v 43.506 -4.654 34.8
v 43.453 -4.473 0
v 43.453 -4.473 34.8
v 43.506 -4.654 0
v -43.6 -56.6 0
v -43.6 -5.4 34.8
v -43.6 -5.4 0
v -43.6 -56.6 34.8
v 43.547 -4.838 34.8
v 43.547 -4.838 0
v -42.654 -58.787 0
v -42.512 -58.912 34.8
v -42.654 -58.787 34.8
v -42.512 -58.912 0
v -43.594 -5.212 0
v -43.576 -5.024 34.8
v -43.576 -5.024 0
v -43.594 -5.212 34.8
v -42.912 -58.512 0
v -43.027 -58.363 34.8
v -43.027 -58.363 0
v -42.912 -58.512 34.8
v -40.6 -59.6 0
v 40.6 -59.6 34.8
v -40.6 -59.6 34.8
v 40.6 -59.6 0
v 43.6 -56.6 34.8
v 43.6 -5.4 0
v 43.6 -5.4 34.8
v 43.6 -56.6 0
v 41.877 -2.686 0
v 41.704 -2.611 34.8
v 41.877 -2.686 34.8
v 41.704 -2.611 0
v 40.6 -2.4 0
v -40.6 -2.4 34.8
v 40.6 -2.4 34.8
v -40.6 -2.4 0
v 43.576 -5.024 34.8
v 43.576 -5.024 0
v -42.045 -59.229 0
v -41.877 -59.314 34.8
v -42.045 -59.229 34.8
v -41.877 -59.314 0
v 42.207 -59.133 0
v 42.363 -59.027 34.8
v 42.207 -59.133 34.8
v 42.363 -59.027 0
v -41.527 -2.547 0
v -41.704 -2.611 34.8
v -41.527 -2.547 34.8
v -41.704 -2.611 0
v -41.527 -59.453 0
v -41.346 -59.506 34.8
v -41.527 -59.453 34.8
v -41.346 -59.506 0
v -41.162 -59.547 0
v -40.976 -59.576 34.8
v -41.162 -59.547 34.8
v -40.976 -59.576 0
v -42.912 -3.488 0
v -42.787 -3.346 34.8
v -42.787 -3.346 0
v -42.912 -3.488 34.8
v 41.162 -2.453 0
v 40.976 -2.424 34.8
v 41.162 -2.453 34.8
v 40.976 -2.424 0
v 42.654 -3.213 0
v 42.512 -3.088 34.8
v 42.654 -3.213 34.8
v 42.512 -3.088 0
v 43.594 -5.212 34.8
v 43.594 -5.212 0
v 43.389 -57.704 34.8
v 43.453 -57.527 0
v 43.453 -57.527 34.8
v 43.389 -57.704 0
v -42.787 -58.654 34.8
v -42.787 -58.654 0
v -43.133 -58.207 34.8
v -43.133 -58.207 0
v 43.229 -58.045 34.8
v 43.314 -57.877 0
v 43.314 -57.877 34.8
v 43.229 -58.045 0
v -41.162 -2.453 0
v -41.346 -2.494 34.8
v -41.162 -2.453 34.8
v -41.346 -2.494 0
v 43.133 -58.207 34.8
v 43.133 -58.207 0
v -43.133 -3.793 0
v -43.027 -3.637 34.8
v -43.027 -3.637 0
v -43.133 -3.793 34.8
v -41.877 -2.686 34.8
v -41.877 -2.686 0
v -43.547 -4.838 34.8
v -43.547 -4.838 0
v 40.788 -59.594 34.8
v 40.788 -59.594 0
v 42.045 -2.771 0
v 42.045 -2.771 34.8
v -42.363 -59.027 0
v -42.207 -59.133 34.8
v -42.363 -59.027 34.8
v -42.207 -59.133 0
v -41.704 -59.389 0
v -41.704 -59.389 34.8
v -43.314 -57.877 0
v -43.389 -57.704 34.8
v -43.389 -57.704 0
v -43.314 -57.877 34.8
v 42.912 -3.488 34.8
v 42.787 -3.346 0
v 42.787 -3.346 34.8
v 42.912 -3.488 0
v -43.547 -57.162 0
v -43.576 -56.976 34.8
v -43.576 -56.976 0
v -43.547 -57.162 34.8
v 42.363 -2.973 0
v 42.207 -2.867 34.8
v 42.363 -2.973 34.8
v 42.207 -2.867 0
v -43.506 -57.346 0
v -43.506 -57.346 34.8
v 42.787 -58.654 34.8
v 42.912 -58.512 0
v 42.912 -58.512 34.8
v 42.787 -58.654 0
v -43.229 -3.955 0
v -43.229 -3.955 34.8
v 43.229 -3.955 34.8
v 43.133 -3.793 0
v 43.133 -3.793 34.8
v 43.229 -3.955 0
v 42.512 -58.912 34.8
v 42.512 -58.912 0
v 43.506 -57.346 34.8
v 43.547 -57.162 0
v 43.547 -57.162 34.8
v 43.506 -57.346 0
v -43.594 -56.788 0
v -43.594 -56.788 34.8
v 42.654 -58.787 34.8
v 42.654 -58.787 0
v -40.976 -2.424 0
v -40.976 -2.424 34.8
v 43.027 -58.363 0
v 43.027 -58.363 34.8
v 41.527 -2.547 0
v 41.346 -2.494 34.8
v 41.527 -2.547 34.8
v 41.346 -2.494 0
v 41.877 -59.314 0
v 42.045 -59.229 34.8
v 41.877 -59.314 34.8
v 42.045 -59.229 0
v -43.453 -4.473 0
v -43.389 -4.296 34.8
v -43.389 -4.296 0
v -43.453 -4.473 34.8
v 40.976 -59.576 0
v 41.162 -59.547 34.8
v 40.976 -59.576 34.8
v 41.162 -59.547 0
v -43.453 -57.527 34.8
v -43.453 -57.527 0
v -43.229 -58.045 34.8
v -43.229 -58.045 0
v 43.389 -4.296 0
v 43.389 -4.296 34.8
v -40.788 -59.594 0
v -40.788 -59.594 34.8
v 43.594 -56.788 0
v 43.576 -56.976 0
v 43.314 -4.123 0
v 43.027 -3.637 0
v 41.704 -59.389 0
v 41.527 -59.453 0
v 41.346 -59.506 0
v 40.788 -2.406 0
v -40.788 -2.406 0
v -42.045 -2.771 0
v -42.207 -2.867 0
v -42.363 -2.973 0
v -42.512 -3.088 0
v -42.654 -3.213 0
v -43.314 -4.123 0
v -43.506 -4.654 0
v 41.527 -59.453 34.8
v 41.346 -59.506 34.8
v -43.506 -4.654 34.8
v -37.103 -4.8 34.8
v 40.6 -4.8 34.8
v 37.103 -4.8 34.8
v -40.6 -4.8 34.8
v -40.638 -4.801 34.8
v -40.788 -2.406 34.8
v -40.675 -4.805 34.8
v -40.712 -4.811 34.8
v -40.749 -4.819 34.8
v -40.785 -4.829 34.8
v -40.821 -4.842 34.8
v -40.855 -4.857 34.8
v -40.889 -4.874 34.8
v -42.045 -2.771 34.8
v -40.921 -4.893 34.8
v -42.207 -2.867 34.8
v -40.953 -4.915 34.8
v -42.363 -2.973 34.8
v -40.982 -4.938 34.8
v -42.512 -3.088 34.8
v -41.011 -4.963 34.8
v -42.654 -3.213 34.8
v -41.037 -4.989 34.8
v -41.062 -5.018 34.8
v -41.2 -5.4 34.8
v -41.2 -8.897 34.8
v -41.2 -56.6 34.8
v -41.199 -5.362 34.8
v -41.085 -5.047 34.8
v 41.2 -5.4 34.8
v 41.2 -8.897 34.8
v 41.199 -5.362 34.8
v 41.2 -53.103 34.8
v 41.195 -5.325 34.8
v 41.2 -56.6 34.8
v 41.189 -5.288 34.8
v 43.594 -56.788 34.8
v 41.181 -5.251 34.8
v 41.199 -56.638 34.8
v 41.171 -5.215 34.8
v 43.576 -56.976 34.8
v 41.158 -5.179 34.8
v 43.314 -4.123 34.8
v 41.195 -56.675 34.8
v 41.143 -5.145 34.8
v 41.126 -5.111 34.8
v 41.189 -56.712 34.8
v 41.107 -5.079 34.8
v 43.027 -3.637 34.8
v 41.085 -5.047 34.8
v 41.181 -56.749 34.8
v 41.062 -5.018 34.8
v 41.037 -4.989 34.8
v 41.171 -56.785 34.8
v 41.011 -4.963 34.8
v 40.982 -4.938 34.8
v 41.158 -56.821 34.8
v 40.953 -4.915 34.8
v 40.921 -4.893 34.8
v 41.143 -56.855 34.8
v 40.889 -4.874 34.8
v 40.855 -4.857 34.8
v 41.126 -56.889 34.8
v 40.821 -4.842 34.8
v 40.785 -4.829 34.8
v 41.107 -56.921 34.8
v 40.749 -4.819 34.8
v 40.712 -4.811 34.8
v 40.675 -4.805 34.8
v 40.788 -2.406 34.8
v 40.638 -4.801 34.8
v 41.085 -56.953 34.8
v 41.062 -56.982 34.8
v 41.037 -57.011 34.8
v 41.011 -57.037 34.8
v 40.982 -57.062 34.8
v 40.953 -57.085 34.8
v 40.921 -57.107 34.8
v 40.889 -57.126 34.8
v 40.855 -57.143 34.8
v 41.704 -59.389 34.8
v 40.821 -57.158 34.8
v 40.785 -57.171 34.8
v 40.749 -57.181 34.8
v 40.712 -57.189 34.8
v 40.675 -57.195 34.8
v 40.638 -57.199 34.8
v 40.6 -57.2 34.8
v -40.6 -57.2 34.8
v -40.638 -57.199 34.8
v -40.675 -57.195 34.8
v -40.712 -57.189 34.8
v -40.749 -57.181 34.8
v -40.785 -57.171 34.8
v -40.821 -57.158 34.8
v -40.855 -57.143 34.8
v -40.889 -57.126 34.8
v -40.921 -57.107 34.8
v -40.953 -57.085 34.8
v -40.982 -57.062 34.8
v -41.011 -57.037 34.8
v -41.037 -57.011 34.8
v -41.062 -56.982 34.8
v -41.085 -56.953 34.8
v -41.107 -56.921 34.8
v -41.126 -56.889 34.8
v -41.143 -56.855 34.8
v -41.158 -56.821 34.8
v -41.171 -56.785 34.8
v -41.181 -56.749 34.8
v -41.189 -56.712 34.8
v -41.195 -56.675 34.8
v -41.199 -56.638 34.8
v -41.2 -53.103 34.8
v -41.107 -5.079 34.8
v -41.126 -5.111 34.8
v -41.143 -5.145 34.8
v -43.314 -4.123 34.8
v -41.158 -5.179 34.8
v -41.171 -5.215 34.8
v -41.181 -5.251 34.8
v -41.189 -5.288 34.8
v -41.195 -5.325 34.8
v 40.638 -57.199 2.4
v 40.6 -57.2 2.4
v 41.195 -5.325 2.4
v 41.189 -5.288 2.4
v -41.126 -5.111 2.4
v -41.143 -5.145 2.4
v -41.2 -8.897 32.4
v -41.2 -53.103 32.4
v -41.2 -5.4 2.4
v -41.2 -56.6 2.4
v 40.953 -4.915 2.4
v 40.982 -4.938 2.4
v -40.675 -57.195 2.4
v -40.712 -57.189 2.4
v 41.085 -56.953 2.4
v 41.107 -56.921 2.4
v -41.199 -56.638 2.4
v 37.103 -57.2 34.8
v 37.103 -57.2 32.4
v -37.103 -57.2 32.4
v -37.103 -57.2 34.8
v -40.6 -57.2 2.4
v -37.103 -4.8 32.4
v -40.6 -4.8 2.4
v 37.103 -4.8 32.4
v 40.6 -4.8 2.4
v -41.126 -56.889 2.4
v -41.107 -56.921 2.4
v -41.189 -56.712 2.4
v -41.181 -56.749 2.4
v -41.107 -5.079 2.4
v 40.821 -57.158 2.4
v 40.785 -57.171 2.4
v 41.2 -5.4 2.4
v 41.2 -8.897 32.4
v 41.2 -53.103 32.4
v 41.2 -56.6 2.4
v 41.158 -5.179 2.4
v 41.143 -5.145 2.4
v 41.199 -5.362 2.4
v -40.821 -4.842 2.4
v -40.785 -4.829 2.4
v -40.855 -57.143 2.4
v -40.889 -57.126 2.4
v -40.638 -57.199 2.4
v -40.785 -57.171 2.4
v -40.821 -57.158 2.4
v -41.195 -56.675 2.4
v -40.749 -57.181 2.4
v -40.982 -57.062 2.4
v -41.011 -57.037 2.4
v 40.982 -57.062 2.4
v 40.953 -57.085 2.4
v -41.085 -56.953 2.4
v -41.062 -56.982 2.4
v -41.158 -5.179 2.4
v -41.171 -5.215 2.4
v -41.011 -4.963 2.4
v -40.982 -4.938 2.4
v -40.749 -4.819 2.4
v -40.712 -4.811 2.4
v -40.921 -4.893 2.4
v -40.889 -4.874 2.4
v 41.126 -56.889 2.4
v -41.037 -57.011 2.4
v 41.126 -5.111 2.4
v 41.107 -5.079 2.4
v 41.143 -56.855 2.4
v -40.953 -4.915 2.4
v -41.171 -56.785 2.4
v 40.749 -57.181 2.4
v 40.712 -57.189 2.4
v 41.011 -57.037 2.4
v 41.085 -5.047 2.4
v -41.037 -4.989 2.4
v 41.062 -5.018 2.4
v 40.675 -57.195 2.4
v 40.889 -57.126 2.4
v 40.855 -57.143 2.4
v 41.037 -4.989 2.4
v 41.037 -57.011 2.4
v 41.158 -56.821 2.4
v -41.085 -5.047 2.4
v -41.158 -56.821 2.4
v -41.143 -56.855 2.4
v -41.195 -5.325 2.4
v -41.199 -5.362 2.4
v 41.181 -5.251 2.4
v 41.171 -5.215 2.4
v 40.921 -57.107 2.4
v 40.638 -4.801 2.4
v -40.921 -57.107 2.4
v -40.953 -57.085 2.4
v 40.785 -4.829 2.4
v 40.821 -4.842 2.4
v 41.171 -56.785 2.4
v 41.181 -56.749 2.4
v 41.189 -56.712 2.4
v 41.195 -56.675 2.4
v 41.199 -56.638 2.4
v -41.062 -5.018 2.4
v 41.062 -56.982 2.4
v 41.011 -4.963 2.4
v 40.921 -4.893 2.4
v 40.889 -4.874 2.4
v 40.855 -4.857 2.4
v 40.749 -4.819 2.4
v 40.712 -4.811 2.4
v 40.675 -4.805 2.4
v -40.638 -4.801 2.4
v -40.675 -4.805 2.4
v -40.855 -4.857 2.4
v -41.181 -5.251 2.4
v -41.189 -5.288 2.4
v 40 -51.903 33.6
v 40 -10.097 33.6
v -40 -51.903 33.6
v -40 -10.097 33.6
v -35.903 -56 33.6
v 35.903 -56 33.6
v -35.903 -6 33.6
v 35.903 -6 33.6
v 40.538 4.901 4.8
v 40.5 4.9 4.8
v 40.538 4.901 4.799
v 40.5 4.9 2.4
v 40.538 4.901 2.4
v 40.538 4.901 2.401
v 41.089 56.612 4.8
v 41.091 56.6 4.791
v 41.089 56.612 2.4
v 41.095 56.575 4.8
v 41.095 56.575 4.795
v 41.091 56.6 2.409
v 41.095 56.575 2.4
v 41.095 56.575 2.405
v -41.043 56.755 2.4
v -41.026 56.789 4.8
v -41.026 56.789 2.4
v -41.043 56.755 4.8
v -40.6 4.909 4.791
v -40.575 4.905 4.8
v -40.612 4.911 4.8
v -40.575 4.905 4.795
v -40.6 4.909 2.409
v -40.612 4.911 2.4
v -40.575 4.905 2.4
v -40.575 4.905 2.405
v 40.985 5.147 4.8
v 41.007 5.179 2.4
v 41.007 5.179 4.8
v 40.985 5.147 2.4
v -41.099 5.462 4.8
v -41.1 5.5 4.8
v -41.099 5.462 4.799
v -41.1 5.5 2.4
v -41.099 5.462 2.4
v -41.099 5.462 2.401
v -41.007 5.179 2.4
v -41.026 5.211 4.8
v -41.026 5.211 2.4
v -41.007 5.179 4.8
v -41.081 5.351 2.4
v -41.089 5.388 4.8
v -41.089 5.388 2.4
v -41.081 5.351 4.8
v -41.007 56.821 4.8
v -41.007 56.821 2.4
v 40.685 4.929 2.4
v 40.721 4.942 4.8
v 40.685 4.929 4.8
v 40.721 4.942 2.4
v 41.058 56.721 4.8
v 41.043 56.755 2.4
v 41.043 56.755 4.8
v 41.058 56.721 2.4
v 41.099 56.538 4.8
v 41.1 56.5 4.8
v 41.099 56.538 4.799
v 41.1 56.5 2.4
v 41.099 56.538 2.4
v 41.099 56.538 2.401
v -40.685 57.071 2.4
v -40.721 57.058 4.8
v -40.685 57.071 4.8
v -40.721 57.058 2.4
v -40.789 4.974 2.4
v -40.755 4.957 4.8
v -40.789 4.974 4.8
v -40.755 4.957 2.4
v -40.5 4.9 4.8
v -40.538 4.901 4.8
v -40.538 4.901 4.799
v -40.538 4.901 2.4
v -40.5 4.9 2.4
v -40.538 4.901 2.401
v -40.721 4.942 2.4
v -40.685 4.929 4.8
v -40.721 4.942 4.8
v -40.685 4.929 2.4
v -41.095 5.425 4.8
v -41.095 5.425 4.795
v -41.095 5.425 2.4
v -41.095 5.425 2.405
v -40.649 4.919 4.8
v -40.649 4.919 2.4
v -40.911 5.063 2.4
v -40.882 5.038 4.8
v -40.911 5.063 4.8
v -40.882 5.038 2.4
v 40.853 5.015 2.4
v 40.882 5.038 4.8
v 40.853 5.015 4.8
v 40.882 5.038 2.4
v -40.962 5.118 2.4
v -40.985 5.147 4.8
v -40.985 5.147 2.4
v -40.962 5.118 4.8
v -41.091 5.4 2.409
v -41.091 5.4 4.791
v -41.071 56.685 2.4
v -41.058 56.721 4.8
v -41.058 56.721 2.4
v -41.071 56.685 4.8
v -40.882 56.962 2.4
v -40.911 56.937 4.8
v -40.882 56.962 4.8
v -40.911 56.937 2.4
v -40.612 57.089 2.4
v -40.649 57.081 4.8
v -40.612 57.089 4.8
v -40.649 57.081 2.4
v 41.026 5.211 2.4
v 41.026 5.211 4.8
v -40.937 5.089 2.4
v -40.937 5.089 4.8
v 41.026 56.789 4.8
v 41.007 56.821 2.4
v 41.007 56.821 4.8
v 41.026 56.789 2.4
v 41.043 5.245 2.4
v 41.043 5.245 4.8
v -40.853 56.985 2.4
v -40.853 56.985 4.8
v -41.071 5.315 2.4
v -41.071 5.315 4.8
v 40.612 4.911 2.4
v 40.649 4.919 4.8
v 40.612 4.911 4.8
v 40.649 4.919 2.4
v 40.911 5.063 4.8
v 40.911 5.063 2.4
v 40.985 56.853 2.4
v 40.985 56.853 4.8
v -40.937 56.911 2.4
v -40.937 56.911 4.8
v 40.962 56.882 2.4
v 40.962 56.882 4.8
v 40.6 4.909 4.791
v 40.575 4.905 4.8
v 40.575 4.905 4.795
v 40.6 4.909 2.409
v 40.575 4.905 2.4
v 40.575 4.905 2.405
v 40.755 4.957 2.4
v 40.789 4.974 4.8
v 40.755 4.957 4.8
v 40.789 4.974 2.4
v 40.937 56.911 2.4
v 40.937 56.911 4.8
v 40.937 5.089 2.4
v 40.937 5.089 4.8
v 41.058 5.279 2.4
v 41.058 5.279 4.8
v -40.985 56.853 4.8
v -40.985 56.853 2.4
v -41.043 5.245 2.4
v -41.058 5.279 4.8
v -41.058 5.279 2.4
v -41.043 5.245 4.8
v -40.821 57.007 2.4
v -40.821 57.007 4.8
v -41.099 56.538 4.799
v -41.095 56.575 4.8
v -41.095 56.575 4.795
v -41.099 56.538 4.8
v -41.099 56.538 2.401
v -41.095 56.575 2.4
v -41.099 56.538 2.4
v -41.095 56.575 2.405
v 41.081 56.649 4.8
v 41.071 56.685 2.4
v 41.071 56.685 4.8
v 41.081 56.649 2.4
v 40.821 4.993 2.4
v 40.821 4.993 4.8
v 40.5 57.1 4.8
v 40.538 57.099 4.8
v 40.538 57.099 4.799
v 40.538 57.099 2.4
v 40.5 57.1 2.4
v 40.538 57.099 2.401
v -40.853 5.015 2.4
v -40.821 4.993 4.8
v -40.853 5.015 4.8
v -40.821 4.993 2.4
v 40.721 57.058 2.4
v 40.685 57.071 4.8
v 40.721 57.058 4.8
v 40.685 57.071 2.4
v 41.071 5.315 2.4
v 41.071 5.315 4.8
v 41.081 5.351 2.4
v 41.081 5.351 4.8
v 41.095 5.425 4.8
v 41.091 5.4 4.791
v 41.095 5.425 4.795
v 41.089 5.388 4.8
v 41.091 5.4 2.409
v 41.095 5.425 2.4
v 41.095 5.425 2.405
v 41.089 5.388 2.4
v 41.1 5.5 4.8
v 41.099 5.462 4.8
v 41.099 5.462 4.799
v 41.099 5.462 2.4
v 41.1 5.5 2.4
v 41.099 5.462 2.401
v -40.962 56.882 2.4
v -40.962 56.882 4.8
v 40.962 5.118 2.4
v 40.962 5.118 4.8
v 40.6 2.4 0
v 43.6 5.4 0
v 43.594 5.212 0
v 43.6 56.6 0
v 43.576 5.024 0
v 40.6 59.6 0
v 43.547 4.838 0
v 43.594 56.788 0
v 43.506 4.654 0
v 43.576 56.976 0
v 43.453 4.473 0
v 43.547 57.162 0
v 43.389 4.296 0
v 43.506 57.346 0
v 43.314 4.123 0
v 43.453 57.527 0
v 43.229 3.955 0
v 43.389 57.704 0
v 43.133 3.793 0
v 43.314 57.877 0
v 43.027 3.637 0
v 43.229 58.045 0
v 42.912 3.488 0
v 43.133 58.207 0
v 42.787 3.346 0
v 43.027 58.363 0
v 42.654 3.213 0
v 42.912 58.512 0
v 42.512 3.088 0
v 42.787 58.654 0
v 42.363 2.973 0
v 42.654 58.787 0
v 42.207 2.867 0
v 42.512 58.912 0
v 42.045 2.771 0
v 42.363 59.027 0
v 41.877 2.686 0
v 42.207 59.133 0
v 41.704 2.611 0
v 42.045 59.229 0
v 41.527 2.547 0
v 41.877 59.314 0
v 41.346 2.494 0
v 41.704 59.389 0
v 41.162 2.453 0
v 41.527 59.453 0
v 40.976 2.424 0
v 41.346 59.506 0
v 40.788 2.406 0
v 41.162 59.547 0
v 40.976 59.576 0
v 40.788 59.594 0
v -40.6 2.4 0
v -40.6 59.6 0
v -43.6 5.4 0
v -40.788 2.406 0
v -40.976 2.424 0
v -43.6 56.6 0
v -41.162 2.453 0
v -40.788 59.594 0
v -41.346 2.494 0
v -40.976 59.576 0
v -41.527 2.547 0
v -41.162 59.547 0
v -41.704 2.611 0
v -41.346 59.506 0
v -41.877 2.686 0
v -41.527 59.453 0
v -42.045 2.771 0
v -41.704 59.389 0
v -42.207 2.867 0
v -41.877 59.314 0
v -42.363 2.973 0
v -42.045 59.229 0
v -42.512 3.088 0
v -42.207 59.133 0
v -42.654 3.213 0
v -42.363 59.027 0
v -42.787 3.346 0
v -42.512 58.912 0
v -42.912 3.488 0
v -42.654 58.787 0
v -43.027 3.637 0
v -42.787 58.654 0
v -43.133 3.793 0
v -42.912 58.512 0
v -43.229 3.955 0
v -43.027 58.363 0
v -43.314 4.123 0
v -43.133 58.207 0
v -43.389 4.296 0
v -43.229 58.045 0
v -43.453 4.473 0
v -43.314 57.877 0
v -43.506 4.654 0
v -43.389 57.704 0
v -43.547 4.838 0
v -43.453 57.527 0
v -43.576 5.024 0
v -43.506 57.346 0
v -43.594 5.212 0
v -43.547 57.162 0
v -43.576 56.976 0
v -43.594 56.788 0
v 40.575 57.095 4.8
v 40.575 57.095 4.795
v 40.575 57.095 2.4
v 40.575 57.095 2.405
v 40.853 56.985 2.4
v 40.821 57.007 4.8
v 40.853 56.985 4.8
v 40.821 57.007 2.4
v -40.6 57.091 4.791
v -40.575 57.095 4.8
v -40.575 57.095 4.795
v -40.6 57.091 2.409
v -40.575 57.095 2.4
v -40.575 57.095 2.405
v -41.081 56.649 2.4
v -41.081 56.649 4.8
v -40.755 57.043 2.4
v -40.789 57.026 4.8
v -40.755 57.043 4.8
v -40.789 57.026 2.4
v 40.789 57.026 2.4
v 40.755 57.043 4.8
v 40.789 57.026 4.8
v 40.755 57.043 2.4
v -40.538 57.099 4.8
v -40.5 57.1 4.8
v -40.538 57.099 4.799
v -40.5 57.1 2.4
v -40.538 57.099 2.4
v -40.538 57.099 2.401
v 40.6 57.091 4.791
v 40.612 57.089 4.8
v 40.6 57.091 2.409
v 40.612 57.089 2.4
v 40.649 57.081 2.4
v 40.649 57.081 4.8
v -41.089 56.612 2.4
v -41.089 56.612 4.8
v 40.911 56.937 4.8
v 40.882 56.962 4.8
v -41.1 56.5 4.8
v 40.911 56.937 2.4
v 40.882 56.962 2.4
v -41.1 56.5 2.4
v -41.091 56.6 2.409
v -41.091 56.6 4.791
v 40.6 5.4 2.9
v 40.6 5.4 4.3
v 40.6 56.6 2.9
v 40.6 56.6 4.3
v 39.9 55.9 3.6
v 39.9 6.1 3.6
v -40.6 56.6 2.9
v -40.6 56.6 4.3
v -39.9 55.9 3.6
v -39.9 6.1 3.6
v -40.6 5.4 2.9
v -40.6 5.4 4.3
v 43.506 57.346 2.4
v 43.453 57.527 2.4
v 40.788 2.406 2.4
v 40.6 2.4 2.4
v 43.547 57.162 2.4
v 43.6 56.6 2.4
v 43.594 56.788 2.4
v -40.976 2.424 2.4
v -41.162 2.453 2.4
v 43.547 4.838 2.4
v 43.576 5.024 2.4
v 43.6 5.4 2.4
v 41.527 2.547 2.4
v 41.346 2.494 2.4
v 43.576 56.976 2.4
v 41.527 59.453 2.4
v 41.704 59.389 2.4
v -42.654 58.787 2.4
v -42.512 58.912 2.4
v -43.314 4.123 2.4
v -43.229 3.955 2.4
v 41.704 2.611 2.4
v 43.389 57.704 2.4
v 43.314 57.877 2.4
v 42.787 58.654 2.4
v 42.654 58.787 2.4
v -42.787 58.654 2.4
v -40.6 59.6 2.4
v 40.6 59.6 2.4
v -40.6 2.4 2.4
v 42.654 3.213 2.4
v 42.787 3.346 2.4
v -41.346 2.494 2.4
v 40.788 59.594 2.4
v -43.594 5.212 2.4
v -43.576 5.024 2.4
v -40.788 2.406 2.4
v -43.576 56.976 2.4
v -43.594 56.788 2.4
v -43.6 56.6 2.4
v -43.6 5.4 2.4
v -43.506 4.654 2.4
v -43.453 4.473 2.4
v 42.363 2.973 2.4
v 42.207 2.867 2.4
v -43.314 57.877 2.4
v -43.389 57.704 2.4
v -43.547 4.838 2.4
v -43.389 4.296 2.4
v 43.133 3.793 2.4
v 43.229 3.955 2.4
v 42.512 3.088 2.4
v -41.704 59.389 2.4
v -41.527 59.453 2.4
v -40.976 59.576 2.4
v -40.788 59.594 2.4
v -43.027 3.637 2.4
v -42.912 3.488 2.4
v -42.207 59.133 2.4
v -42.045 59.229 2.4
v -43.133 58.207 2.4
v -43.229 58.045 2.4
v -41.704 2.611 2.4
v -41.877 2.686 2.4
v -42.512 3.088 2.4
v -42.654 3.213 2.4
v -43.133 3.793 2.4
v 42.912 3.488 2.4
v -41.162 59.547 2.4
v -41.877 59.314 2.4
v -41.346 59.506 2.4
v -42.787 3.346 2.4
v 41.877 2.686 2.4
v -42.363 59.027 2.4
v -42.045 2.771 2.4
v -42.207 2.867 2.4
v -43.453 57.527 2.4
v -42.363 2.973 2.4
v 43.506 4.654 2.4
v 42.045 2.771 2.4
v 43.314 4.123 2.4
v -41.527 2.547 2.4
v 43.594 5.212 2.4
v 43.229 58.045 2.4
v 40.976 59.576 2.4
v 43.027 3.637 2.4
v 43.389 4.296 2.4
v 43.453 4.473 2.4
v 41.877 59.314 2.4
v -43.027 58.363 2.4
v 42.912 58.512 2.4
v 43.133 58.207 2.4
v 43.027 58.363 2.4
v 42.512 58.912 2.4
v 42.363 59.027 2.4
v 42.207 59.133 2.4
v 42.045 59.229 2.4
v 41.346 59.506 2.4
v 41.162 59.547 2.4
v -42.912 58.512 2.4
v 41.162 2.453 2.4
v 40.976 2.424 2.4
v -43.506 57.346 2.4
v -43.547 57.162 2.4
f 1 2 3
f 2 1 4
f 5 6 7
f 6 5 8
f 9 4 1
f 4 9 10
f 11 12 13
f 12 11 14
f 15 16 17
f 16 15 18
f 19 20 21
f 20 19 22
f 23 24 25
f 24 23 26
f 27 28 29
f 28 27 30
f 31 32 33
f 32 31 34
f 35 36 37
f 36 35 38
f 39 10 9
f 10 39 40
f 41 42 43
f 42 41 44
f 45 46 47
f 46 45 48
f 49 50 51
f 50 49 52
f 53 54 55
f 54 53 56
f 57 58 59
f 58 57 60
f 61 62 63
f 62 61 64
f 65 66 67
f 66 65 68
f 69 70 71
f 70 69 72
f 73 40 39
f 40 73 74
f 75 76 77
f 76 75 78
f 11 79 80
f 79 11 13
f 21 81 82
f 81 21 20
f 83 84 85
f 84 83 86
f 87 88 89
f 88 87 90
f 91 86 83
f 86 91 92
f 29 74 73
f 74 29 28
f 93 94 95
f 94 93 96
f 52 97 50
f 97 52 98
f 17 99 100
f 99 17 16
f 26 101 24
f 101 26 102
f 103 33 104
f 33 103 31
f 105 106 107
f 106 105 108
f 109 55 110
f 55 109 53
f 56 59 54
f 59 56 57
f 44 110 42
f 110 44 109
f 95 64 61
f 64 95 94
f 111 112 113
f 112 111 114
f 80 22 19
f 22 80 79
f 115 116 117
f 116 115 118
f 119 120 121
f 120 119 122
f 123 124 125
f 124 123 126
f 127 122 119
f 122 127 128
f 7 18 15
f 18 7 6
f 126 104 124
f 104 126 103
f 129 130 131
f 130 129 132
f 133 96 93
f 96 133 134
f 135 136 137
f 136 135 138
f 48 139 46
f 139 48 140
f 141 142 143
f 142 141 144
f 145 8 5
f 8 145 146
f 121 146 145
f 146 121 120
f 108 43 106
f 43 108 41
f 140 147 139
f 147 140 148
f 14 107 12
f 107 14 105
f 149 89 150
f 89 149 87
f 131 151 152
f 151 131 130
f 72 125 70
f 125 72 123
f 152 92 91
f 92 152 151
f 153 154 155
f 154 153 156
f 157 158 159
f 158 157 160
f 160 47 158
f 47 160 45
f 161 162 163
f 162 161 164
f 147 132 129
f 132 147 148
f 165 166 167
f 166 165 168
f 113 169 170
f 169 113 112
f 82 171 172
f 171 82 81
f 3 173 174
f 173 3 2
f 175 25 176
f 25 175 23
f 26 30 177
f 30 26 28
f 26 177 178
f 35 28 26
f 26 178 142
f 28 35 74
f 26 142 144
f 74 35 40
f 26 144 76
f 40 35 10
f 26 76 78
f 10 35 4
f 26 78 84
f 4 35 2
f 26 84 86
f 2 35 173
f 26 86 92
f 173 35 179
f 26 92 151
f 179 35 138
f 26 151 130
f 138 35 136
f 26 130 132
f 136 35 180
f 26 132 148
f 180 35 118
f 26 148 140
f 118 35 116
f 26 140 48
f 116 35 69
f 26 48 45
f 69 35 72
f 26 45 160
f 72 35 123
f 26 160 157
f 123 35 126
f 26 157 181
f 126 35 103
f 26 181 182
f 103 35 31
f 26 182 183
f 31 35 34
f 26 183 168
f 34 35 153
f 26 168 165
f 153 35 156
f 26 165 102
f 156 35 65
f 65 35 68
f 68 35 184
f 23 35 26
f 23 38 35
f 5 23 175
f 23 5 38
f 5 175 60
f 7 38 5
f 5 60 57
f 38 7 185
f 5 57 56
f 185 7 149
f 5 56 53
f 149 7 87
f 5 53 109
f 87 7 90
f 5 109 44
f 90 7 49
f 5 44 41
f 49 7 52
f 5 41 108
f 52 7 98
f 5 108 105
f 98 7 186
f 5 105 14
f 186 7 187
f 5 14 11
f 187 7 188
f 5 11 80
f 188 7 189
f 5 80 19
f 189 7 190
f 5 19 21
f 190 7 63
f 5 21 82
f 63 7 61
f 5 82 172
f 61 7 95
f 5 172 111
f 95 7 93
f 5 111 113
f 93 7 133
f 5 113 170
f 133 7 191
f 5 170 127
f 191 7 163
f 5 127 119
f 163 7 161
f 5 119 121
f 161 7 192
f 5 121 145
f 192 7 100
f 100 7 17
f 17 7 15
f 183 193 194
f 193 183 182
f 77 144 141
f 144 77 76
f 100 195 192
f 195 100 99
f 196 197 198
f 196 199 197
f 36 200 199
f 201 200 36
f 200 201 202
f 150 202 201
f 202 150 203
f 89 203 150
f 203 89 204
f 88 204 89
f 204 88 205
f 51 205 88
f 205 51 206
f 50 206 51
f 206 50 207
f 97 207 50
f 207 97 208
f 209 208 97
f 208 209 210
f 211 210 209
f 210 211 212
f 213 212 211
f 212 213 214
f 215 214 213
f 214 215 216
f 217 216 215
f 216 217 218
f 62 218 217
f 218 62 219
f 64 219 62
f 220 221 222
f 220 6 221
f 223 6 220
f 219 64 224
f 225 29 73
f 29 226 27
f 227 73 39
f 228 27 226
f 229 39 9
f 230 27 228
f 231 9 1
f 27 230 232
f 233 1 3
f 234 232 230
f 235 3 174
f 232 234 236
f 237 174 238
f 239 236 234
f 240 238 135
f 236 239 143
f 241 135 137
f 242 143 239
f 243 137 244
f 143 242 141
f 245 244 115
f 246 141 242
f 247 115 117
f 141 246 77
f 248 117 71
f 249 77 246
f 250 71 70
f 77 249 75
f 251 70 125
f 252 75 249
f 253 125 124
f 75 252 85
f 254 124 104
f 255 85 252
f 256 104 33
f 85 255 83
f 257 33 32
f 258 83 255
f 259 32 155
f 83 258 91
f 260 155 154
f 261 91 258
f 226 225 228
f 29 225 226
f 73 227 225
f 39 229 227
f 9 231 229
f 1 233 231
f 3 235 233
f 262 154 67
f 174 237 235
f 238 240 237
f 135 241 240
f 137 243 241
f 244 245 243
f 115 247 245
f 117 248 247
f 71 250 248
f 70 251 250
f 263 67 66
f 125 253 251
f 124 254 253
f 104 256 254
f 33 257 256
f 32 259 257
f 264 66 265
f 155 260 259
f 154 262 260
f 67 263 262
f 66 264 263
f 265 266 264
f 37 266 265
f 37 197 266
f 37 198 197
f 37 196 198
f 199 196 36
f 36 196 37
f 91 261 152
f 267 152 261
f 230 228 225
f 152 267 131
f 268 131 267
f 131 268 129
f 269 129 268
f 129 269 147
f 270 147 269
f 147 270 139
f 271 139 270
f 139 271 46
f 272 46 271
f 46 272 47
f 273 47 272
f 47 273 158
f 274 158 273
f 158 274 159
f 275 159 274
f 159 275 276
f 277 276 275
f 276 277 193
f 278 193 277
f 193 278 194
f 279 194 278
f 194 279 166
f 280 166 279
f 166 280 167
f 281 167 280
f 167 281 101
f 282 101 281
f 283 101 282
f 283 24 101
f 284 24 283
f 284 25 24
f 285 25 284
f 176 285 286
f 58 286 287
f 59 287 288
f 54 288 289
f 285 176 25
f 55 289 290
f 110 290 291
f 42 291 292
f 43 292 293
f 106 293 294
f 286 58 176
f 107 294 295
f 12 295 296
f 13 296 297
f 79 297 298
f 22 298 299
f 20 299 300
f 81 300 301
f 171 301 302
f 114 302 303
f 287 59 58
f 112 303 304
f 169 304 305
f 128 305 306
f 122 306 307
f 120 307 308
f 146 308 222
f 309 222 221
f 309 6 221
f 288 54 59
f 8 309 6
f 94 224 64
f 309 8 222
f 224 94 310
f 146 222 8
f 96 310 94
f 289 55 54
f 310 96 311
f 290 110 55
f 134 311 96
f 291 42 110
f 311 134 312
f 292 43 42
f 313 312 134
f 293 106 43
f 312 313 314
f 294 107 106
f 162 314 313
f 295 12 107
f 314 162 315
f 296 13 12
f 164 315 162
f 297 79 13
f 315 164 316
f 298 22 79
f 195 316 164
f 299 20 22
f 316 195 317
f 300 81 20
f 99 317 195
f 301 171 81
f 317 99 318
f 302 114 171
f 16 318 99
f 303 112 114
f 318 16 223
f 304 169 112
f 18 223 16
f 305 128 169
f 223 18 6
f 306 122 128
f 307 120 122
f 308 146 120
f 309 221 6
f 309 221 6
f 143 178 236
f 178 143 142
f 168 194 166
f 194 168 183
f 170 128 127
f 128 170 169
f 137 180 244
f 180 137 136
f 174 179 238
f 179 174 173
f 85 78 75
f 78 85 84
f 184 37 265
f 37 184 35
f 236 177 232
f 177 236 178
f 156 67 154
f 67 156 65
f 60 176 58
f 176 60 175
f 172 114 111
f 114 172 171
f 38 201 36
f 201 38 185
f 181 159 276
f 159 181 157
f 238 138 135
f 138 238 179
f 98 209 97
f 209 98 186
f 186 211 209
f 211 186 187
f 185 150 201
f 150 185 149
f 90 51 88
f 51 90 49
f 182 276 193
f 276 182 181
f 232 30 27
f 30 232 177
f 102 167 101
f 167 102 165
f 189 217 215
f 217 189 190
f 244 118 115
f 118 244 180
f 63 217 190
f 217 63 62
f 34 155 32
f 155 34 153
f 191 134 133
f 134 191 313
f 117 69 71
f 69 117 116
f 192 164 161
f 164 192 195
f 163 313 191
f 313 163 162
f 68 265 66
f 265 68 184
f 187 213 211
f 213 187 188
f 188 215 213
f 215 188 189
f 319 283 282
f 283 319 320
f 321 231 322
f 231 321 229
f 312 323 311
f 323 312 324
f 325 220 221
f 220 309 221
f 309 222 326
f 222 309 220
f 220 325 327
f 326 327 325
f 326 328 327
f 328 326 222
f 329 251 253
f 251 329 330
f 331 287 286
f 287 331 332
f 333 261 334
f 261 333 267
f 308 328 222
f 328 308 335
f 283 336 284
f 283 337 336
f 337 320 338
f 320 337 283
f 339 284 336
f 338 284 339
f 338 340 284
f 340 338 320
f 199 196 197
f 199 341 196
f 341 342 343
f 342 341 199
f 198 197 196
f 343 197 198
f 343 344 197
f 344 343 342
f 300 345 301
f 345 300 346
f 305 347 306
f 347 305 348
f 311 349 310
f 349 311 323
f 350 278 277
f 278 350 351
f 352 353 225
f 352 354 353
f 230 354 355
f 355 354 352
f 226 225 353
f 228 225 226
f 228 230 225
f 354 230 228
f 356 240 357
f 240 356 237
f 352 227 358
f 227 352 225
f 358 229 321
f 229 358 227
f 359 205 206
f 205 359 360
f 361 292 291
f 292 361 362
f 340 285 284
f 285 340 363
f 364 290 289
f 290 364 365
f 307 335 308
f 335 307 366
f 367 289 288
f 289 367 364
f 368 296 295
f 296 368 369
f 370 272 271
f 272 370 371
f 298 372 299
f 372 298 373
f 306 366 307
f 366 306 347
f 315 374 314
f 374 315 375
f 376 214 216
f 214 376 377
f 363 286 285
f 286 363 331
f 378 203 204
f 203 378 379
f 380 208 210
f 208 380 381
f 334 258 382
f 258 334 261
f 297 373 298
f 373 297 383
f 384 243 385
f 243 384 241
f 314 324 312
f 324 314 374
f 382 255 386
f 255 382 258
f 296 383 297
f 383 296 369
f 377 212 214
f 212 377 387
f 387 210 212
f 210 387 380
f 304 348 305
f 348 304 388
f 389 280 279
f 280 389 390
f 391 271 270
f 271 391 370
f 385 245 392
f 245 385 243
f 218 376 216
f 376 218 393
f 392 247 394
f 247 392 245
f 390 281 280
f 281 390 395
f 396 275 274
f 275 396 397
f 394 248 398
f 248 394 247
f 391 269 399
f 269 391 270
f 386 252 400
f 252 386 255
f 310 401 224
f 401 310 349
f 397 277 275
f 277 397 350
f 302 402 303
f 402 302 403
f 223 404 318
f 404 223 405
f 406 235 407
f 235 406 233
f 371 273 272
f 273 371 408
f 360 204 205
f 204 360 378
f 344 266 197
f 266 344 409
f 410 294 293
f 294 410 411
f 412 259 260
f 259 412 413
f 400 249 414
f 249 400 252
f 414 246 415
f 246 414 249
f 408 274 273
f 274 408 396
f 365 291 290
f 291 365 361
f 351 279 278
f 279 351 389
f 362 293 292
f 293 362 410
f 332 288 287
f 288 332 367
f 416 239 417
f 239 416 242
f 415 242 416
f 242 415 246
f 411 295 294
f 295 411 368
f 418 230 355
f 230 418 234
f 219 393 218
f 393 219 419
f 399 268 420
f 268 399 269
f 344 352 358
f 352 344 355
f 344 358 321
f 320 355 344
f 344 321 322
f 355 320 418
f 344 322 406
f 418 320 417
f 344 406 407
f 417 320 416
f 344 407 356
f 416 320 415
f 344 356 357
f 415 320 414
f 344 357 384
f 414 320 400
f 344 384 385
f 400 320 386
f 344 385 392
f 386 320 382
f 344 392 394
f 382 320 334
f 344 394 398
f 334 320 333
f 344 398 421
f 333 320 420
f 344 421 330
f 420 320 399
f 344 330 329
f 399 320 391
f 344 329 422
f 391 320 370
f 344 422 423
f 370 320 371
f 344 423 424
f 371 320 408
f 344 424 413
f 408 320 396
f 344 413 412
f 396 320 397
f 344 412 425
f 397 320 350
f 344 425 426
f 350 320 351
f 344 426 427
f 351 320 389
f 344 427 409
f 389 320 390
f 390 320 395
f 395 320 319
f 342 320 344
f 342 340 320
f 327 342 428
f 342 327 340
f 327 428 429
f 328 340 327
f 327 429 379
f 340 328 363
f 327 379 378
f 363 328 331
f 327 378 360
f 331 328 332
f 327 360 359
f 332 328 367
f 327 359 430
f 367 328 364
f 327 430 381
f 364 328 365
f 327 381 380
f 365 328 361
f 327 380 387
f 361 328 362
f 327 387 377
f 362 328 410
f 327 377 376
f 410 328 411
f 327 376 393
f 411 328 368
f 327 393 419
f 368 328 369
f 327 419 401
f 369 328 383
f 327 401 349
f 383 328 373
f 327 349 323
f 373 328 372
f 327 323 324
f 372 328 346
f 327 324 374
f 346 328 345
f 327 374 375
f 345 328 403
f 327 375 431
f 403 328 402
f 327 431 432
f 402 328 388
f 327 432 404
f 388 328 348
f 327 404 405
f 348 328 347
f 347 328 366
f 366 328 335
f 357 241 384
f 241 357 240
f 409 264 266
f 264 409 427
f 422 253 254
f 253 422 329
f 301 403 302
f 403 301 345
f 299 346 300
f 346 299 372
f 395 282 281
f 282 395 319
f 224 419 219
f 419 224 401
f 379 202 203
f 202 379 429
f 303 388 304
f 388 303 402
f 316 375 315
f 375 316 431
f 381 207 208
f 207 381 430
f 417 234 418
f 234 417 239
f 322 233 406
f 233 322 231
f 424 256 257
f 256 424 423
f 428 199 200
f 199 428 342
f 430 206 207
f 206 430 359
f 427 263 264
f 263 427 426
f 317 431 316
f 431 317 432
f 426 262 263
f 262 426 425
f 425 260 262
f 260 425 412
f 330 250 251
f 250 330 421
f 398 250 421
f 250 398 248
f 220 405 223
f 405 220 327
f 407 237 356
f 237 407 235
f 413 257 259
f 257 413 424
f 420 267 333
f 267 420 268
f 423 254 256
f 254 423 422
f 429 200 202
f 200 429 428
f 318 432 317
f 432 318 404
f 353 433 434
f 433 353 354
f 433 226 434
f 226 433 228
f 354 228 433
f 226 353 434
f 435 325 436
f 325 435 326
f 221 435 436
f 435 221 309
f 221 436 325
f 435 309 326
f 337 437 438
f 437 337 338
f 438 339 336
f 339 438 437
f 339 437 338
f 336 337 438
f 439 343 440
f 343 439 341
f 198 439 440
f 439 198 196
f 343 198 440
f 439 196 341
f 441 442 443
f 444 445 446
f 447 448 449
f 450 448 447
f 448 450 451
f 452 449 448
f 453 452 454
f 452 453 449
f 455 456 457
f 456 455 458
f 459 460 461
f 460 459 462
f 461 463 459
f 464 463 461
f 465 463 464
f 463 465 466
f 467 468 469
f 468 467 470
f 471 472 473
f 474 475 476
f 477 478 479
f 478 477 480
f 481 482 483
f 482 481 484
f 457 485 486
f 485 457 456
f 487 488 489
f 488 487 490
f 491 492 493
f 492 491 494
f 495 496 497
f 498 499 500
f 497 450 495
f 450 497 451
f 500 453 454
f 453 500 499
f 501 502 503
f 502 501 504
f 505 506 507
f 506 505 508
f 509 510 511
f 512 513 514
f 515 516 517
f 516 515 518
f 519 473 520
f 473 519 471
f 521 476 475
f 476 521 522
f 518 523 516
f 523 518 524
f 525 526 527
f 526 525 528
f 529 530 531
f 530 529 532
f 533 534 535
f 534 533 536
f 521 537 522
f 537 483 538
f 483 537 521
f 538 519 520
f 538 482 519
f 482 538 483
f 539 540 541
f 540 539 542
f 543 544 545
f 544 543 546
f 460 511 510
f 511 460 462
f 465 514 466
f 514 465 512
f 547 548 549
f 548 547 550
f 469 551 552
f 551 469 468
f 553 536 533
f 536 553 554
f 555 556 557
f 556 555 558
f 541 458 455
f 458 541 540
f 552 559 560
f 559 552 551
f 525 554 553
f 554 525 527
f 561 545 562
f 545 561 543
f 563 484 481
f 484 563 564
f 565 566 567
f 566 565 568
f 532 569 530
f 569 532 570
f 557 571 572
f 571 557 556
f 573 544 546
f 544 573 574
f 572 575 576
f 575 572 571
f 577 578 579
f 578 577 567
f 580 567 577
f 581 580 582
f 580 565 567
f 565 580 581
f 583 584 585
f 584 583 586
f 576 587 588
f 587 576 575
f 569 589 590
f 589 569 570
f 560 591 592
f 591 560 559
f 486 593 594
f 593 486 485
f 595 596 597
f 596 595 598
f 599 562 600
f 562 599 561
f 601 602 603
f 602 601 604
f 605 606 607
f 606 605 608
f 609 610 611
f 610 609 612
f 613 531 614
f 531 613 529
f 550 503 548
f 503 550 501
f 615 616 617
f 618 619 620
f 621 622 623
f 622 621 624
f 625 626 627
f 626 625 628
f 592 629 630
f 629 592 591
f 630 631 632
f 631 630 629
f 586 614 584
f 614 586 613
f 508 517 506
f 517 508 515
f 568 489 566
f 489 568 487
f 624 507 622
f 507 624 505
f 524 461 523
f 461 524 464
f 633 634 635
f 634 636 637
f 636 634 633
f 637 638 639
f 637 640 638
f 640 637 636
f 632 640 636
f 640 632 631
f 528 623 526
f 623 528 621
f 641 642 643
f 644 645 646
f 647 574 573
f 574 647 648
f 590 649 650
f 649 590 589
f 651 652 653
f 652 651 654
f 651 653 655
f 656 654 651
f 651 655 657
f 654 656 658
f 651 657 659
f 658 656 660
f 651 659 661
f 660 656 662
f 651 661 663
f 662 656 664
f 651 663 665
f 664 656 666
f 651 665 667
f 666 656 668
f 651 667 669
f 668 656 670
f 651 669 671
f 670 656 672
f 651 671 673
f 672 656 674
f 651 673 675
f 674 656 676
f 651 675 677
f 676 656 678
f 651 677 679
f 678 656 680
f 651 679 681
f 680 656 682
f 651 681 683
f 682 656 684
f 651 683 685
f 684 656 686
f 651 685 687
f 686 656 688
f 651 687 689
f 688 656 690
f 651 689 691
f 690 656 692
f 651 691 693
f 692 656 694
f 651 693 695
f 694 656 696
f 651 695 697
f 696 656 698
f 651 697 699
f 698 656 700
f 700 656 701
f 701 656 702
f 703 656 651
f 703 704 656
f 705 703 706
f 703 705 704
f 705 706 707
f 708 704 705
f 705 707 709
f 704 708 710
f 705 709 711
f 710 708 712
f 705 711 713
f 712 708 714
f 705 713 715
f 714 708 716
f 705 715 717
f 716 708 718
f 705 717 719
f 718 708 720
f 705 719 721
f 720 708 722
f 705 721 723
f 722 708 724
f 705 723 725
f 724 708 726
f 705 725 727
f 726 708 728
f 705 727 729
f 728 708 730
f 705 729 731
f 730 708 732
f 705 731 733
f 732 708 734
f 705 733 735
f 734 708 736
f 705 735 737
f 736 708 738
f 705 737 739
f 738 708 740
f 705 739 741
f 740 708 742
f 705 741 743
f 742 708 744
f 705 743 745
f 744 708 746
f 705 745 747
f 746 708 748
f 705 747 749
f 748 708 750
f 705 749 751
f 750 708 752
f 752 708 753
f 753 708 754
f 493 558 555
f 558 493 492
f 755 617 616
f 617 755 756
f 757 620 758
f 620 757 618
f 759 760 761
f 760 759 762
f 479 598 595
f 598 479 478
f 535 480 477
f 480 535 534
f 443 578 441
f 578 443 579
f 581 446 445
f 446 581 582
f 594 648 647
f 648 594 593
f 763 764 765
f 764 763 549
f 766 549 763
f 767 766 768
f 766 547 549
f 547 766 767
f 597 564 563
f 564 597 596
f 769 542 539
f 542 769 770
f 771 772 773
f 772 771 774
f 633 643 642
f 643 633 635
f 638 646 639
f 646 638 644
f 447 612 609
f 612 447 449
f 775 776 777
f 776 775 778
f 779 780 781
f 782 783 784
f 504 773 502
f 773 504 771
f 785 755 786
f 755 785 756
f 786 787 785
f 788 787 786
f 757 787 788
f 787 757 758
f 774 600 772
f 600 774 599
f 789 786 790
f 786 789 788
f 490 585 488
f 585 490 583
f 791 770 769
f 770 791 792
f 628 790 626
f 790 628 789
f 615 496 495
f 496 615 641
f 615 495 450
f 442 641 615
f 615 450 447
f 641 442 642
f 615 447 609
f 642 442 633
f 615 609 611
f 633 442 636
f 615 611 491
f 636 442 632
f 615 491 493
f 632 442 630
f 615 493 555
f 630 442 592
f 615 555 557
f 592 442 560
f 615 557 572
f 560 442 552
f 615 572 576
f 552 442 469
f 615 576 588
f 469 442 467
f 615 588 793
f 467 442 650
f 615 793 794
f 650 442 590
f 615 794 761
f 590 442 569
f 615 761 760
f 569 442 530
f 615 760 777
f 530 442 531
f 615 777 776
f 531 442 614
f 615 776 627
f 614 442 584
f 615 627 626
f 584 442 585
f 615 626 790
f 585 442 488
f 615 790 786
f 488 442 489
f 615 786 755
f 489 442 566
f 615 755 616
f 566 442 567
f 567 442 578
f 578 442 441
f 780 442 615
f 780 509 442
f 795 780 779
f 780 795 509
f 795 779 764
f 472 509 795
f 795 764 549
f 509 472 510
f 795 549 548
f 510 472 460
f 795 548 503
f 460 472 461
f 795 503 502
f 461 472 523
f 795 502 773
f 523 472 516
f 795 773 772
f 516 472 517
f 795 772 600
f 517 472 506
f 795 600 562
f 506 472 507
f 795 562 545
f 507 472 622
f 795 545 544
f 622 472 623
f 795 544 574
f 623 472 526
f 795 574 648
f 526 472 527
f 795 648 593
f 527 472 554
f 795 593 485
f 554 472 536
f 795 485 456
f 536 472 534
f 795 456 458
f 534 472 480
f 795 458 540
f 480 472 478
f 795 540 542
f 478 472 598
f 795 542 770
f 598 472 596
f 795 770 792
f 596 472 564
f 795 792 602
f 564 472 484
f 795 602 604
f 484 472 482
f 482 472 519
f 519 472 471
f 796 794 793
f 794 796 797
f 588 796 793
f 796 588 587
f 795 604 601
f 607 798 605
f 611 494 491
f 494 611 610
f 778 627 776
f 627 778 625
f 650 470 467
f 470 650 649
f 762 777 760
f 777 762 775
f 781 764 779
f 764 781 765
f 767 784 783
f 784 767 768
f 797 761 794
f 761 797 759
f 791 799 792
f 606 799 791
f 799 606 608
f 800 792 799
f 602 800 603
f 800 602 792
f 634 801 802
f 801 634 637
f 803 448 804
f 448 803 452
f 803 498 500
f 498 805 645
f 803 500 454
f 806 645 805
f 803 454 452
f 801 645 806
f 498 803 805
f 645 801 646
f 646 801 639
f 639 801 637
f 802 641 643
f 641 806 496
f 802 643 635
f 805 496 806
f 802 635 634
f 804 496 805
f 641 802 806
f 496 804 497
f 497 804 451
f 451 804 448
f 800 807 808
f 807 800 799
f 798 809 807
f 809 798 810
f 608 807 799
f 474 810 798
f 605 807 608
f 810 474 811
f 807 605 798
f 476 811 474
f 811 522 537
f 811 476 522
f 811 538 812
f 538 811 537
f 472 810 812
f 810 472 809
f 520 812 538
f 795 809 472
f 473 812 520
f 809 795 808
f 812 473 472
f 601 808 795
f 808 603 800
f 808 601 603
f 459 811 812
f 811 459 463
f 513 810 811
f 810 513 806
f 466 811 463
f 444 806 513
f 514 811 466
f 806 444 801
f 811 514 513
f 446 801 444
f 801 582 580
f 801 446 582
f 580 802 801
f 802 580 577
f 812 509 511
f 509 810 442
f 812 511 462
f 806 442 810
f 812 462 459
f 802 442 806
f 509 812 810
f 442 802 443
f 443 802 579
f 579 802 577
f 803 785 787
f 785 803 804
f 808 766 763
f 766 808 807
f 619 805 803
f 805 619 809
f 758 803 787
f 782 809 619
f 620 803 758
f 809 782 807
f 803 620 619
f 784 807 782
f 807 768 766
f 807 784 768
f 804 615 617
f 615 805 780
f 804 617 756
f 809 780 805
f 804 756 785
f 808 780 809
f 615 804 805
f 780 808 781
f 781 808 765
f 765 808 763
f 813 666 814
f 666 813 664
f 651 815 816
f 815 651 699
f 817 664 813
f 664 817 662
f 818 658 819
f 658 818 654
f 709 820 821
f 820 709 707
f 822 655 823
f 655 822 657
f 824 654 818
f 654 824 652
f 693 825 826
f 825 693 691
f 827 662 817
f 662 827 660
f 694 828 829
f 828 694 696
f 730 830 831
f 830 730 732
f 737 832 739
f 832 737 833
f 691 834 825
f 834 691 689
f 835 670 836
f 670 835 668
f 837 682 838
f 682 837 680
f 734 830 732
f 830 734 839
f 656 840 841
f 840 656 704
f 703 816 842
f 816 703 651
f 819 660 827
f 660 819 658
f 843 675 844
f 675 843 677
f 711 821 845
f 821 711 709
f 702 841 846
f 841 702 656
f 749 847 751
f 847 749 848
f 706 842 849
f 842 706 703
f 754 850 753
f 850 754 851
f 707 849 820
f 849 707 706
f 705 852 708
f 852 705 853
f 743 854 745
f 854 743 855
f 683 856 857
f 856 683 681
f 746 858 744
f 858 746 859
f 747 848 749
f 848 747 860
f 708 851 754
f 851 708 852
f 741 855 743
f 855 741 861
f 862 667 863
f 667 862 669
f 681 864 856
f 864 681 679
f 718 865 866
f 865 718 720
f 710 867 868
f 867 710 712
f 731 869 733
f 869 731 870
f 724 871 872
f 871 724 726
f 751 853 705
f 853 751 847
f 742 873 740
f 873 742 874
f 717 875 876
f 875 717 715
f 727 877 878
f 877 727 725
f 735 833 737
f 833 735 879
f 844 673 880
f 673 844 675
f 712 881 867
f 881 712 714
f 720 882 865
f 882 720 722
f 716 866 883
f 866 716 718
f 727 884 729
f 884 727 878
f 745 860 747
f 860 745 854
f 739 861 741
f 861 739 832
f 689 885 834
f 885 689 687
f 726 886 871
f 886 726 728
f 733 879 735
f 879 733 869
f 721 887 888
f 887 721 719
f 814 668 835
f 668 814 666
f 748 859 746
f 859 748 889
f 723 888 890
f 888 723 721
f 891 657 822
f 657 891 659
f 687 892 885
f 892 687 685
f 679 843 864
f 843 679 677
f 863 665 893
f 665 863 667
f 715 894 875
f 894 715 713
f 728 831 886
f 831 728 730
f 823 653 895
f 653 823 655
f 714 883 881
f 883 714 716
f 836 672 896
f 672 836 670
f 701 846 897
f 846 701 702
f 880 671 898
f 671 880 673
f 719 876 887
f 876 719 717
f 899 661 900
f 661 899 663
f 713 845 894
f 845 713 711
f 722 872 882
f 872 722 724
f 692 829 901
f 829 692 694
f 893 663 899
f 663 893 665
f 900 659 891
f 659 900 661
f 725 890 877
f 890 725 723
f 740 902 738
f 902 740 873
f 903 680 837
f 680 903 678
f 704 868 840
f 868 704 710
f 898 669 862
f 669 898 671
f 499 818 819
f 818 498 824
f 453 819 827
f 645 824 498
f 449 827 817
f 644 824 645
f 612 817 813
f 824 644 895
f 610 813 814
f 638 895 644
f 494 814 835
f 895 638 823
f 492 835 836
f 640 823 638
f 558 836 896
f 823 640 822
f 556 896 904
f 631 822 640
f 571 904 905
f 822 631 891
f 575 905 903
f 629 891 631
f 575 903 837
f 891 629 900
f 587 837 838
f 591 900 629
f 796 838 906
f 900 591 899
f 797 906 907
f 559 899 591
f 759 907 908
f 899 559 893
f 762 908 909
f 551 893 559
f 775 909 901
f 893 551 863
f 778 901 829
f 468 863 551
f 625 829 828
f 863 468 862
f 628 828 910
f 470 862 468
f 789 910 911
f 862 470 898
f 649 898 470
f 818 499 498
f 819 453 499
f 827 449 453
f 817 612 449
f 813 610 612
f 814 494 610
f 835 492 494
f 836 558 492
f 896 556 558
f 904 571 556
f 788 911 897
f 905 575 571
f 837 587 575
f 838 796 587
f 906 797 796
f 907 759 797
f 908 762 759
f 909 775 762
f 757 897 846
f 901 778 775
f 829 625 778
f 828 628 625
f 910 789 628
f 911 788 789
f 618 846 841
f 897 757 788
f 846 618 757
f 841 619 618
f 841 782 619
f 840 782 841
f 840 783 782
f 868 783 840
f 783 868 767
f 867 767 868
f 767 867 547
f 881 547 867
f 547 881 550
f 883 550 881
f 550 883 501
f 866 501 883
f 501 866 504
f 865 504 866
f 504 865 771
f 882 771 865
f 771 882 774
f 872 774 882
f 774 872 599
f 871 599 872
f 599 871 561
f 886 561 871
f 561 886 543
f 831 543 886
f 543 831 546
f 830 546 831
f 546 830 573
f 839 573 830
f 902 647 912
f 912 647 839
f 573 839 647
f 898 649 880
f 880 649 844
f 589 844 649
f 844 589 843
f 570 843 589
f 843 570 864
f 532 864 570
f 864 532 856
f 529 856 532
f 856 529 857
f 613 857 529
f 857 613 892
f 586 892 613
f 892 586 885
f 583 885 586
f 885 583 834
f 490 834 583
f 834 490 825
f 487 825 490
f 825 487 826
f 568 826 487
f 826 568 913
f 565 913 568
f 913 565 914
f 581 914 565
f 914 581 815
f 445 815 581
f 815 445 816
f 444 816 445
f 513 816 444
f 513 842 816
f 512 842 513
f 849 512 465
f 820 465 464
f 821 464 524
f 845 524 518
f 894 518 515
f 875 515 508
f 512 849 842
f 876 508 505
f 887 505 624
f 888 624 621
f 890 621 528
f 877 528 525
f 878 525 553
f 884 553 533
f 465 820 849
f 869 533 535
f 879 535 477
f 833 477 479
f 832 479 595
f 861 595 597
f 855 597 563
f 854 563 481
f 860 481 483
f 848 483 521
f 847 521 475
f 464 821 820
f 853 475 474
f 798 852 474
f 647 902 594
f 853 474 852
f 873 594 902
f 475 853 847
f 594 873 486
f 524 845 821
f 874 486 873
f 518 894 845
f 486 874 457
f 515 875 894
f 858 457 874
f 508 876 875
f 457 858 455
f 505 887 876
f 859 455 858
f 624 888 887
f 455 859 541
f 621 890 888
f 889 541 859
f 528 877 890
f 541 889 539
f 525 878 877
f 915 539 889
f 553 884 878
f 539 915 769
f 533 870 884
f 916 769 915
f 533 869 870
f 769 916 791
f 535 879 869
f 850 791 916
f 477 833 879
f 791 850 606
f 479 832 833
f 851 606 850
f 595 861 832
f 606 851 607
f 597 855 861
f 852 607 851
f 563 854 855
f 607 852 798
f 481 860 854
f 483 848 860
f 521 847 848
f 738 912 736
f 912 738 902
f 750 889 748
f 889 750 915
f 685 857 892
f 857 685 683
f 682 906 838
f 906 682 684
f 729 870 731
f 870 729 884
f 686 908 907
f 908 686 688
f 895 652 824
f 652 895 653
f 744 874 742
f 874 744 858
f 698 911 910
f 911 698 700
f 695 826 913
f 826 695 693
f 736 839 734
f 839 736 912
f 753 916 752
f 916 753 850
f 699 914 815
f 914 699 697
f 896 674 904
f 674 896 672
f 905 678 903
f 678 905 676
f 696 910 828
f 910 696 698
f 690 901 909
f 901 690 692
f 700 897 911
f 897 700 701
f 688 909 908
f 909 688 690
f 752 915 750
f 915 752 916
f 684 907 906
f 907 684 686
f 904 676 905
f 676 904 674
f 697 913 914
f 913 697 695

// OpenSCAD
// Which one would you like to see?
part = "both"; // [box:Box only, top: Top cover only, both: Box and top cover]

// Size of your printer's nozzle in mm
nozzle_size = 0.4;

// Number of walls the print should have
number_of_walls = 6; // [1:5]

// Tolerance (use 0.2 for FDM)
tolerance = 0.2; // [0.1:0.1:0.4]

// Outer x dimension in mm
x=80+2*number_of_walls*nozzle_size+2*3*nozzle_size;

// Outer y dimension in mm
y=50+2*number_of_walls*nozzle_size+2*3*nozzle_size;

// Outer z dimension in mm
z=30+2*number_of_walls*nozzle_size+2*3*nozzle_size;

// Radius for rounded corners in mm
radius=3; // [1:20]

/* Hidden */
$fn=100;

wall_thickness=nozzle_size*number_of_walls;
hook_thickness = 3*nozzle_size;

top_cover_wall_thickness = hook_thickness + wall_thickness;

module bottom_box () {
    difference(){
        // Solid box
        linear_extrude(z-wall_thickness){
            minkowski(){
                square([x-radius*2,y-radius*2], center=true);
                circle(radius, center=true);
            }
        }
        
        // Hollow out
        translate([0,0,wall_thickness]) linear_extrude(z){
            minkowski(){
                square([x-radius*2-wall_thickness*2+wall_thickness*2,y-radius*2-wall_thickness*2+wall_thickness*2], center=true);
                circle(radius-wall_thickness);
            }
        }
    }
    left_hook(); // left hook
    rotate([180,180,0]) left_hook(); // right hook
    front_hook(); // front hook
    rotate([180,180,0]) front_hook(); // back hook
    // TODO: hooks on the other two sides
}

module left_hook () {
    
    translate([(x-2*wall_thickness)/2,-y/2+radius*2,z-wall_thickness]) rotate([0,90,90]) {
        difference(){
            linear_extrude(y-2*radius*2){
    polygon(points=[[0,0],[2*hook_thickness,0],[hook_thickness,hook_thickness]], center=true);
        }
             translate([hook_thickness, hook_thickness, 0]) rotate([45,0,0]) cube(2*hook_thickness, center=true);
             translate([hook_thickness, hook_thickness, y-2*radius*2]) rotate([45,0,0]) cube(2*hook_thickness, center=true);        
        }
    }
}
    

module front_hook () {
    translate([(-x+4*radius)/2,-y/2+wall_thickness,z-wall_thickness]) rotate([90,90,90]) {
        difference(){
        linear_extrude(x-2*radius*2){
    polygon(points=[[0,0],[2*hook_thickness,0],[hook_thickness,hook_thickness]], center=true);
    }
             translate([hook_thickness, hook_thickness, 0]) rotate([45,0,0]) cube(2*hook_thickness, center=true);
             translate([hook_thickness, hook_thickness, x-2*radius*2]) rotate([45,0,0]) cube(2*hook_thickness, center=true);
        }
    }
}


module right_grove () {
    translate([-tolerance/2+(x-2*wall_thickness)/2,-y/2+radius,wall_thickness+hook_thickness*2]) rotate([0,90,90]) linear_extrude(y-2*radius){
    polygon(points=[[0,0],[2*hook_thickness,0],[hook_thickness,hook_thickness]], center=true);
    }
}


module front_grove () {
    translate([(-x+2*radius)/2,-y/2+wall_thickness+tolerance/2,wall_thickness+hook_thickness*2]) rotate([90,90,90]) linear_extrude(x-2*radius){
    polygon(points=[[0,0],[2*hook_thickness,0],[hook_thickness,hook_thickness]], center=true);
    }
}

module top_cover () {

    // Top face
    linear_extrude(wall_thickness){
        minkowski(){
            square([x-radius*2,y-radius*2], center=true);
            circle(radius, center=true);
        }
    }
    
    difference(){
        // Wall of top cover
        linear_extrude(wall_thickness+hook_thickness*2){
            minkowski(){
                square([x-radius*2-wall_thickness*2-tolerance+wall_thickness*2,y-radius*2-wall_thickness*2-tolerance+wall_thickness*2], center=true);
                circle(radius-wall_thickness, center=true);
            }
        }
        
        // Hollow out
        // TODO: If radius is very small, still hollow out

        translate([0,0,wall_thickness]) linear_extrude(z){
            minkowski(){
                square([x-radius*2-wall_thickness*2-2*top_cover_wall_thickness-tolerance+wall_thickness*2+top_cover_wall_thickness*2,y-radius*2-wall_thickness*2-2*top_cover_wall_thickness-tolerance+wall_thickness*2+top_cover_wall_thickness*2], center=true);
            circle(radius-wall_thickness-top_cover_wall_thickness);
            }
        }
    right_grove();
    rotate([180,180,0]) right_grove();
    front_grove();
    rotate([180,180,0])  front_grove();
    }
  

}

// left_hook();
print_part();

module print_part() {
	if (part == "box") {
		bottom_box();
	} else if (part == "top") {
		top_cover();
	} else if (part == "both") {
		both();
	} else {
		both();
	}
}

module both() {
	translate([0,-(y/2+wall_thickness),0]) bottom_box();
    translate([0,+(y/2+wall_thickness),0]) top_cover();
}
